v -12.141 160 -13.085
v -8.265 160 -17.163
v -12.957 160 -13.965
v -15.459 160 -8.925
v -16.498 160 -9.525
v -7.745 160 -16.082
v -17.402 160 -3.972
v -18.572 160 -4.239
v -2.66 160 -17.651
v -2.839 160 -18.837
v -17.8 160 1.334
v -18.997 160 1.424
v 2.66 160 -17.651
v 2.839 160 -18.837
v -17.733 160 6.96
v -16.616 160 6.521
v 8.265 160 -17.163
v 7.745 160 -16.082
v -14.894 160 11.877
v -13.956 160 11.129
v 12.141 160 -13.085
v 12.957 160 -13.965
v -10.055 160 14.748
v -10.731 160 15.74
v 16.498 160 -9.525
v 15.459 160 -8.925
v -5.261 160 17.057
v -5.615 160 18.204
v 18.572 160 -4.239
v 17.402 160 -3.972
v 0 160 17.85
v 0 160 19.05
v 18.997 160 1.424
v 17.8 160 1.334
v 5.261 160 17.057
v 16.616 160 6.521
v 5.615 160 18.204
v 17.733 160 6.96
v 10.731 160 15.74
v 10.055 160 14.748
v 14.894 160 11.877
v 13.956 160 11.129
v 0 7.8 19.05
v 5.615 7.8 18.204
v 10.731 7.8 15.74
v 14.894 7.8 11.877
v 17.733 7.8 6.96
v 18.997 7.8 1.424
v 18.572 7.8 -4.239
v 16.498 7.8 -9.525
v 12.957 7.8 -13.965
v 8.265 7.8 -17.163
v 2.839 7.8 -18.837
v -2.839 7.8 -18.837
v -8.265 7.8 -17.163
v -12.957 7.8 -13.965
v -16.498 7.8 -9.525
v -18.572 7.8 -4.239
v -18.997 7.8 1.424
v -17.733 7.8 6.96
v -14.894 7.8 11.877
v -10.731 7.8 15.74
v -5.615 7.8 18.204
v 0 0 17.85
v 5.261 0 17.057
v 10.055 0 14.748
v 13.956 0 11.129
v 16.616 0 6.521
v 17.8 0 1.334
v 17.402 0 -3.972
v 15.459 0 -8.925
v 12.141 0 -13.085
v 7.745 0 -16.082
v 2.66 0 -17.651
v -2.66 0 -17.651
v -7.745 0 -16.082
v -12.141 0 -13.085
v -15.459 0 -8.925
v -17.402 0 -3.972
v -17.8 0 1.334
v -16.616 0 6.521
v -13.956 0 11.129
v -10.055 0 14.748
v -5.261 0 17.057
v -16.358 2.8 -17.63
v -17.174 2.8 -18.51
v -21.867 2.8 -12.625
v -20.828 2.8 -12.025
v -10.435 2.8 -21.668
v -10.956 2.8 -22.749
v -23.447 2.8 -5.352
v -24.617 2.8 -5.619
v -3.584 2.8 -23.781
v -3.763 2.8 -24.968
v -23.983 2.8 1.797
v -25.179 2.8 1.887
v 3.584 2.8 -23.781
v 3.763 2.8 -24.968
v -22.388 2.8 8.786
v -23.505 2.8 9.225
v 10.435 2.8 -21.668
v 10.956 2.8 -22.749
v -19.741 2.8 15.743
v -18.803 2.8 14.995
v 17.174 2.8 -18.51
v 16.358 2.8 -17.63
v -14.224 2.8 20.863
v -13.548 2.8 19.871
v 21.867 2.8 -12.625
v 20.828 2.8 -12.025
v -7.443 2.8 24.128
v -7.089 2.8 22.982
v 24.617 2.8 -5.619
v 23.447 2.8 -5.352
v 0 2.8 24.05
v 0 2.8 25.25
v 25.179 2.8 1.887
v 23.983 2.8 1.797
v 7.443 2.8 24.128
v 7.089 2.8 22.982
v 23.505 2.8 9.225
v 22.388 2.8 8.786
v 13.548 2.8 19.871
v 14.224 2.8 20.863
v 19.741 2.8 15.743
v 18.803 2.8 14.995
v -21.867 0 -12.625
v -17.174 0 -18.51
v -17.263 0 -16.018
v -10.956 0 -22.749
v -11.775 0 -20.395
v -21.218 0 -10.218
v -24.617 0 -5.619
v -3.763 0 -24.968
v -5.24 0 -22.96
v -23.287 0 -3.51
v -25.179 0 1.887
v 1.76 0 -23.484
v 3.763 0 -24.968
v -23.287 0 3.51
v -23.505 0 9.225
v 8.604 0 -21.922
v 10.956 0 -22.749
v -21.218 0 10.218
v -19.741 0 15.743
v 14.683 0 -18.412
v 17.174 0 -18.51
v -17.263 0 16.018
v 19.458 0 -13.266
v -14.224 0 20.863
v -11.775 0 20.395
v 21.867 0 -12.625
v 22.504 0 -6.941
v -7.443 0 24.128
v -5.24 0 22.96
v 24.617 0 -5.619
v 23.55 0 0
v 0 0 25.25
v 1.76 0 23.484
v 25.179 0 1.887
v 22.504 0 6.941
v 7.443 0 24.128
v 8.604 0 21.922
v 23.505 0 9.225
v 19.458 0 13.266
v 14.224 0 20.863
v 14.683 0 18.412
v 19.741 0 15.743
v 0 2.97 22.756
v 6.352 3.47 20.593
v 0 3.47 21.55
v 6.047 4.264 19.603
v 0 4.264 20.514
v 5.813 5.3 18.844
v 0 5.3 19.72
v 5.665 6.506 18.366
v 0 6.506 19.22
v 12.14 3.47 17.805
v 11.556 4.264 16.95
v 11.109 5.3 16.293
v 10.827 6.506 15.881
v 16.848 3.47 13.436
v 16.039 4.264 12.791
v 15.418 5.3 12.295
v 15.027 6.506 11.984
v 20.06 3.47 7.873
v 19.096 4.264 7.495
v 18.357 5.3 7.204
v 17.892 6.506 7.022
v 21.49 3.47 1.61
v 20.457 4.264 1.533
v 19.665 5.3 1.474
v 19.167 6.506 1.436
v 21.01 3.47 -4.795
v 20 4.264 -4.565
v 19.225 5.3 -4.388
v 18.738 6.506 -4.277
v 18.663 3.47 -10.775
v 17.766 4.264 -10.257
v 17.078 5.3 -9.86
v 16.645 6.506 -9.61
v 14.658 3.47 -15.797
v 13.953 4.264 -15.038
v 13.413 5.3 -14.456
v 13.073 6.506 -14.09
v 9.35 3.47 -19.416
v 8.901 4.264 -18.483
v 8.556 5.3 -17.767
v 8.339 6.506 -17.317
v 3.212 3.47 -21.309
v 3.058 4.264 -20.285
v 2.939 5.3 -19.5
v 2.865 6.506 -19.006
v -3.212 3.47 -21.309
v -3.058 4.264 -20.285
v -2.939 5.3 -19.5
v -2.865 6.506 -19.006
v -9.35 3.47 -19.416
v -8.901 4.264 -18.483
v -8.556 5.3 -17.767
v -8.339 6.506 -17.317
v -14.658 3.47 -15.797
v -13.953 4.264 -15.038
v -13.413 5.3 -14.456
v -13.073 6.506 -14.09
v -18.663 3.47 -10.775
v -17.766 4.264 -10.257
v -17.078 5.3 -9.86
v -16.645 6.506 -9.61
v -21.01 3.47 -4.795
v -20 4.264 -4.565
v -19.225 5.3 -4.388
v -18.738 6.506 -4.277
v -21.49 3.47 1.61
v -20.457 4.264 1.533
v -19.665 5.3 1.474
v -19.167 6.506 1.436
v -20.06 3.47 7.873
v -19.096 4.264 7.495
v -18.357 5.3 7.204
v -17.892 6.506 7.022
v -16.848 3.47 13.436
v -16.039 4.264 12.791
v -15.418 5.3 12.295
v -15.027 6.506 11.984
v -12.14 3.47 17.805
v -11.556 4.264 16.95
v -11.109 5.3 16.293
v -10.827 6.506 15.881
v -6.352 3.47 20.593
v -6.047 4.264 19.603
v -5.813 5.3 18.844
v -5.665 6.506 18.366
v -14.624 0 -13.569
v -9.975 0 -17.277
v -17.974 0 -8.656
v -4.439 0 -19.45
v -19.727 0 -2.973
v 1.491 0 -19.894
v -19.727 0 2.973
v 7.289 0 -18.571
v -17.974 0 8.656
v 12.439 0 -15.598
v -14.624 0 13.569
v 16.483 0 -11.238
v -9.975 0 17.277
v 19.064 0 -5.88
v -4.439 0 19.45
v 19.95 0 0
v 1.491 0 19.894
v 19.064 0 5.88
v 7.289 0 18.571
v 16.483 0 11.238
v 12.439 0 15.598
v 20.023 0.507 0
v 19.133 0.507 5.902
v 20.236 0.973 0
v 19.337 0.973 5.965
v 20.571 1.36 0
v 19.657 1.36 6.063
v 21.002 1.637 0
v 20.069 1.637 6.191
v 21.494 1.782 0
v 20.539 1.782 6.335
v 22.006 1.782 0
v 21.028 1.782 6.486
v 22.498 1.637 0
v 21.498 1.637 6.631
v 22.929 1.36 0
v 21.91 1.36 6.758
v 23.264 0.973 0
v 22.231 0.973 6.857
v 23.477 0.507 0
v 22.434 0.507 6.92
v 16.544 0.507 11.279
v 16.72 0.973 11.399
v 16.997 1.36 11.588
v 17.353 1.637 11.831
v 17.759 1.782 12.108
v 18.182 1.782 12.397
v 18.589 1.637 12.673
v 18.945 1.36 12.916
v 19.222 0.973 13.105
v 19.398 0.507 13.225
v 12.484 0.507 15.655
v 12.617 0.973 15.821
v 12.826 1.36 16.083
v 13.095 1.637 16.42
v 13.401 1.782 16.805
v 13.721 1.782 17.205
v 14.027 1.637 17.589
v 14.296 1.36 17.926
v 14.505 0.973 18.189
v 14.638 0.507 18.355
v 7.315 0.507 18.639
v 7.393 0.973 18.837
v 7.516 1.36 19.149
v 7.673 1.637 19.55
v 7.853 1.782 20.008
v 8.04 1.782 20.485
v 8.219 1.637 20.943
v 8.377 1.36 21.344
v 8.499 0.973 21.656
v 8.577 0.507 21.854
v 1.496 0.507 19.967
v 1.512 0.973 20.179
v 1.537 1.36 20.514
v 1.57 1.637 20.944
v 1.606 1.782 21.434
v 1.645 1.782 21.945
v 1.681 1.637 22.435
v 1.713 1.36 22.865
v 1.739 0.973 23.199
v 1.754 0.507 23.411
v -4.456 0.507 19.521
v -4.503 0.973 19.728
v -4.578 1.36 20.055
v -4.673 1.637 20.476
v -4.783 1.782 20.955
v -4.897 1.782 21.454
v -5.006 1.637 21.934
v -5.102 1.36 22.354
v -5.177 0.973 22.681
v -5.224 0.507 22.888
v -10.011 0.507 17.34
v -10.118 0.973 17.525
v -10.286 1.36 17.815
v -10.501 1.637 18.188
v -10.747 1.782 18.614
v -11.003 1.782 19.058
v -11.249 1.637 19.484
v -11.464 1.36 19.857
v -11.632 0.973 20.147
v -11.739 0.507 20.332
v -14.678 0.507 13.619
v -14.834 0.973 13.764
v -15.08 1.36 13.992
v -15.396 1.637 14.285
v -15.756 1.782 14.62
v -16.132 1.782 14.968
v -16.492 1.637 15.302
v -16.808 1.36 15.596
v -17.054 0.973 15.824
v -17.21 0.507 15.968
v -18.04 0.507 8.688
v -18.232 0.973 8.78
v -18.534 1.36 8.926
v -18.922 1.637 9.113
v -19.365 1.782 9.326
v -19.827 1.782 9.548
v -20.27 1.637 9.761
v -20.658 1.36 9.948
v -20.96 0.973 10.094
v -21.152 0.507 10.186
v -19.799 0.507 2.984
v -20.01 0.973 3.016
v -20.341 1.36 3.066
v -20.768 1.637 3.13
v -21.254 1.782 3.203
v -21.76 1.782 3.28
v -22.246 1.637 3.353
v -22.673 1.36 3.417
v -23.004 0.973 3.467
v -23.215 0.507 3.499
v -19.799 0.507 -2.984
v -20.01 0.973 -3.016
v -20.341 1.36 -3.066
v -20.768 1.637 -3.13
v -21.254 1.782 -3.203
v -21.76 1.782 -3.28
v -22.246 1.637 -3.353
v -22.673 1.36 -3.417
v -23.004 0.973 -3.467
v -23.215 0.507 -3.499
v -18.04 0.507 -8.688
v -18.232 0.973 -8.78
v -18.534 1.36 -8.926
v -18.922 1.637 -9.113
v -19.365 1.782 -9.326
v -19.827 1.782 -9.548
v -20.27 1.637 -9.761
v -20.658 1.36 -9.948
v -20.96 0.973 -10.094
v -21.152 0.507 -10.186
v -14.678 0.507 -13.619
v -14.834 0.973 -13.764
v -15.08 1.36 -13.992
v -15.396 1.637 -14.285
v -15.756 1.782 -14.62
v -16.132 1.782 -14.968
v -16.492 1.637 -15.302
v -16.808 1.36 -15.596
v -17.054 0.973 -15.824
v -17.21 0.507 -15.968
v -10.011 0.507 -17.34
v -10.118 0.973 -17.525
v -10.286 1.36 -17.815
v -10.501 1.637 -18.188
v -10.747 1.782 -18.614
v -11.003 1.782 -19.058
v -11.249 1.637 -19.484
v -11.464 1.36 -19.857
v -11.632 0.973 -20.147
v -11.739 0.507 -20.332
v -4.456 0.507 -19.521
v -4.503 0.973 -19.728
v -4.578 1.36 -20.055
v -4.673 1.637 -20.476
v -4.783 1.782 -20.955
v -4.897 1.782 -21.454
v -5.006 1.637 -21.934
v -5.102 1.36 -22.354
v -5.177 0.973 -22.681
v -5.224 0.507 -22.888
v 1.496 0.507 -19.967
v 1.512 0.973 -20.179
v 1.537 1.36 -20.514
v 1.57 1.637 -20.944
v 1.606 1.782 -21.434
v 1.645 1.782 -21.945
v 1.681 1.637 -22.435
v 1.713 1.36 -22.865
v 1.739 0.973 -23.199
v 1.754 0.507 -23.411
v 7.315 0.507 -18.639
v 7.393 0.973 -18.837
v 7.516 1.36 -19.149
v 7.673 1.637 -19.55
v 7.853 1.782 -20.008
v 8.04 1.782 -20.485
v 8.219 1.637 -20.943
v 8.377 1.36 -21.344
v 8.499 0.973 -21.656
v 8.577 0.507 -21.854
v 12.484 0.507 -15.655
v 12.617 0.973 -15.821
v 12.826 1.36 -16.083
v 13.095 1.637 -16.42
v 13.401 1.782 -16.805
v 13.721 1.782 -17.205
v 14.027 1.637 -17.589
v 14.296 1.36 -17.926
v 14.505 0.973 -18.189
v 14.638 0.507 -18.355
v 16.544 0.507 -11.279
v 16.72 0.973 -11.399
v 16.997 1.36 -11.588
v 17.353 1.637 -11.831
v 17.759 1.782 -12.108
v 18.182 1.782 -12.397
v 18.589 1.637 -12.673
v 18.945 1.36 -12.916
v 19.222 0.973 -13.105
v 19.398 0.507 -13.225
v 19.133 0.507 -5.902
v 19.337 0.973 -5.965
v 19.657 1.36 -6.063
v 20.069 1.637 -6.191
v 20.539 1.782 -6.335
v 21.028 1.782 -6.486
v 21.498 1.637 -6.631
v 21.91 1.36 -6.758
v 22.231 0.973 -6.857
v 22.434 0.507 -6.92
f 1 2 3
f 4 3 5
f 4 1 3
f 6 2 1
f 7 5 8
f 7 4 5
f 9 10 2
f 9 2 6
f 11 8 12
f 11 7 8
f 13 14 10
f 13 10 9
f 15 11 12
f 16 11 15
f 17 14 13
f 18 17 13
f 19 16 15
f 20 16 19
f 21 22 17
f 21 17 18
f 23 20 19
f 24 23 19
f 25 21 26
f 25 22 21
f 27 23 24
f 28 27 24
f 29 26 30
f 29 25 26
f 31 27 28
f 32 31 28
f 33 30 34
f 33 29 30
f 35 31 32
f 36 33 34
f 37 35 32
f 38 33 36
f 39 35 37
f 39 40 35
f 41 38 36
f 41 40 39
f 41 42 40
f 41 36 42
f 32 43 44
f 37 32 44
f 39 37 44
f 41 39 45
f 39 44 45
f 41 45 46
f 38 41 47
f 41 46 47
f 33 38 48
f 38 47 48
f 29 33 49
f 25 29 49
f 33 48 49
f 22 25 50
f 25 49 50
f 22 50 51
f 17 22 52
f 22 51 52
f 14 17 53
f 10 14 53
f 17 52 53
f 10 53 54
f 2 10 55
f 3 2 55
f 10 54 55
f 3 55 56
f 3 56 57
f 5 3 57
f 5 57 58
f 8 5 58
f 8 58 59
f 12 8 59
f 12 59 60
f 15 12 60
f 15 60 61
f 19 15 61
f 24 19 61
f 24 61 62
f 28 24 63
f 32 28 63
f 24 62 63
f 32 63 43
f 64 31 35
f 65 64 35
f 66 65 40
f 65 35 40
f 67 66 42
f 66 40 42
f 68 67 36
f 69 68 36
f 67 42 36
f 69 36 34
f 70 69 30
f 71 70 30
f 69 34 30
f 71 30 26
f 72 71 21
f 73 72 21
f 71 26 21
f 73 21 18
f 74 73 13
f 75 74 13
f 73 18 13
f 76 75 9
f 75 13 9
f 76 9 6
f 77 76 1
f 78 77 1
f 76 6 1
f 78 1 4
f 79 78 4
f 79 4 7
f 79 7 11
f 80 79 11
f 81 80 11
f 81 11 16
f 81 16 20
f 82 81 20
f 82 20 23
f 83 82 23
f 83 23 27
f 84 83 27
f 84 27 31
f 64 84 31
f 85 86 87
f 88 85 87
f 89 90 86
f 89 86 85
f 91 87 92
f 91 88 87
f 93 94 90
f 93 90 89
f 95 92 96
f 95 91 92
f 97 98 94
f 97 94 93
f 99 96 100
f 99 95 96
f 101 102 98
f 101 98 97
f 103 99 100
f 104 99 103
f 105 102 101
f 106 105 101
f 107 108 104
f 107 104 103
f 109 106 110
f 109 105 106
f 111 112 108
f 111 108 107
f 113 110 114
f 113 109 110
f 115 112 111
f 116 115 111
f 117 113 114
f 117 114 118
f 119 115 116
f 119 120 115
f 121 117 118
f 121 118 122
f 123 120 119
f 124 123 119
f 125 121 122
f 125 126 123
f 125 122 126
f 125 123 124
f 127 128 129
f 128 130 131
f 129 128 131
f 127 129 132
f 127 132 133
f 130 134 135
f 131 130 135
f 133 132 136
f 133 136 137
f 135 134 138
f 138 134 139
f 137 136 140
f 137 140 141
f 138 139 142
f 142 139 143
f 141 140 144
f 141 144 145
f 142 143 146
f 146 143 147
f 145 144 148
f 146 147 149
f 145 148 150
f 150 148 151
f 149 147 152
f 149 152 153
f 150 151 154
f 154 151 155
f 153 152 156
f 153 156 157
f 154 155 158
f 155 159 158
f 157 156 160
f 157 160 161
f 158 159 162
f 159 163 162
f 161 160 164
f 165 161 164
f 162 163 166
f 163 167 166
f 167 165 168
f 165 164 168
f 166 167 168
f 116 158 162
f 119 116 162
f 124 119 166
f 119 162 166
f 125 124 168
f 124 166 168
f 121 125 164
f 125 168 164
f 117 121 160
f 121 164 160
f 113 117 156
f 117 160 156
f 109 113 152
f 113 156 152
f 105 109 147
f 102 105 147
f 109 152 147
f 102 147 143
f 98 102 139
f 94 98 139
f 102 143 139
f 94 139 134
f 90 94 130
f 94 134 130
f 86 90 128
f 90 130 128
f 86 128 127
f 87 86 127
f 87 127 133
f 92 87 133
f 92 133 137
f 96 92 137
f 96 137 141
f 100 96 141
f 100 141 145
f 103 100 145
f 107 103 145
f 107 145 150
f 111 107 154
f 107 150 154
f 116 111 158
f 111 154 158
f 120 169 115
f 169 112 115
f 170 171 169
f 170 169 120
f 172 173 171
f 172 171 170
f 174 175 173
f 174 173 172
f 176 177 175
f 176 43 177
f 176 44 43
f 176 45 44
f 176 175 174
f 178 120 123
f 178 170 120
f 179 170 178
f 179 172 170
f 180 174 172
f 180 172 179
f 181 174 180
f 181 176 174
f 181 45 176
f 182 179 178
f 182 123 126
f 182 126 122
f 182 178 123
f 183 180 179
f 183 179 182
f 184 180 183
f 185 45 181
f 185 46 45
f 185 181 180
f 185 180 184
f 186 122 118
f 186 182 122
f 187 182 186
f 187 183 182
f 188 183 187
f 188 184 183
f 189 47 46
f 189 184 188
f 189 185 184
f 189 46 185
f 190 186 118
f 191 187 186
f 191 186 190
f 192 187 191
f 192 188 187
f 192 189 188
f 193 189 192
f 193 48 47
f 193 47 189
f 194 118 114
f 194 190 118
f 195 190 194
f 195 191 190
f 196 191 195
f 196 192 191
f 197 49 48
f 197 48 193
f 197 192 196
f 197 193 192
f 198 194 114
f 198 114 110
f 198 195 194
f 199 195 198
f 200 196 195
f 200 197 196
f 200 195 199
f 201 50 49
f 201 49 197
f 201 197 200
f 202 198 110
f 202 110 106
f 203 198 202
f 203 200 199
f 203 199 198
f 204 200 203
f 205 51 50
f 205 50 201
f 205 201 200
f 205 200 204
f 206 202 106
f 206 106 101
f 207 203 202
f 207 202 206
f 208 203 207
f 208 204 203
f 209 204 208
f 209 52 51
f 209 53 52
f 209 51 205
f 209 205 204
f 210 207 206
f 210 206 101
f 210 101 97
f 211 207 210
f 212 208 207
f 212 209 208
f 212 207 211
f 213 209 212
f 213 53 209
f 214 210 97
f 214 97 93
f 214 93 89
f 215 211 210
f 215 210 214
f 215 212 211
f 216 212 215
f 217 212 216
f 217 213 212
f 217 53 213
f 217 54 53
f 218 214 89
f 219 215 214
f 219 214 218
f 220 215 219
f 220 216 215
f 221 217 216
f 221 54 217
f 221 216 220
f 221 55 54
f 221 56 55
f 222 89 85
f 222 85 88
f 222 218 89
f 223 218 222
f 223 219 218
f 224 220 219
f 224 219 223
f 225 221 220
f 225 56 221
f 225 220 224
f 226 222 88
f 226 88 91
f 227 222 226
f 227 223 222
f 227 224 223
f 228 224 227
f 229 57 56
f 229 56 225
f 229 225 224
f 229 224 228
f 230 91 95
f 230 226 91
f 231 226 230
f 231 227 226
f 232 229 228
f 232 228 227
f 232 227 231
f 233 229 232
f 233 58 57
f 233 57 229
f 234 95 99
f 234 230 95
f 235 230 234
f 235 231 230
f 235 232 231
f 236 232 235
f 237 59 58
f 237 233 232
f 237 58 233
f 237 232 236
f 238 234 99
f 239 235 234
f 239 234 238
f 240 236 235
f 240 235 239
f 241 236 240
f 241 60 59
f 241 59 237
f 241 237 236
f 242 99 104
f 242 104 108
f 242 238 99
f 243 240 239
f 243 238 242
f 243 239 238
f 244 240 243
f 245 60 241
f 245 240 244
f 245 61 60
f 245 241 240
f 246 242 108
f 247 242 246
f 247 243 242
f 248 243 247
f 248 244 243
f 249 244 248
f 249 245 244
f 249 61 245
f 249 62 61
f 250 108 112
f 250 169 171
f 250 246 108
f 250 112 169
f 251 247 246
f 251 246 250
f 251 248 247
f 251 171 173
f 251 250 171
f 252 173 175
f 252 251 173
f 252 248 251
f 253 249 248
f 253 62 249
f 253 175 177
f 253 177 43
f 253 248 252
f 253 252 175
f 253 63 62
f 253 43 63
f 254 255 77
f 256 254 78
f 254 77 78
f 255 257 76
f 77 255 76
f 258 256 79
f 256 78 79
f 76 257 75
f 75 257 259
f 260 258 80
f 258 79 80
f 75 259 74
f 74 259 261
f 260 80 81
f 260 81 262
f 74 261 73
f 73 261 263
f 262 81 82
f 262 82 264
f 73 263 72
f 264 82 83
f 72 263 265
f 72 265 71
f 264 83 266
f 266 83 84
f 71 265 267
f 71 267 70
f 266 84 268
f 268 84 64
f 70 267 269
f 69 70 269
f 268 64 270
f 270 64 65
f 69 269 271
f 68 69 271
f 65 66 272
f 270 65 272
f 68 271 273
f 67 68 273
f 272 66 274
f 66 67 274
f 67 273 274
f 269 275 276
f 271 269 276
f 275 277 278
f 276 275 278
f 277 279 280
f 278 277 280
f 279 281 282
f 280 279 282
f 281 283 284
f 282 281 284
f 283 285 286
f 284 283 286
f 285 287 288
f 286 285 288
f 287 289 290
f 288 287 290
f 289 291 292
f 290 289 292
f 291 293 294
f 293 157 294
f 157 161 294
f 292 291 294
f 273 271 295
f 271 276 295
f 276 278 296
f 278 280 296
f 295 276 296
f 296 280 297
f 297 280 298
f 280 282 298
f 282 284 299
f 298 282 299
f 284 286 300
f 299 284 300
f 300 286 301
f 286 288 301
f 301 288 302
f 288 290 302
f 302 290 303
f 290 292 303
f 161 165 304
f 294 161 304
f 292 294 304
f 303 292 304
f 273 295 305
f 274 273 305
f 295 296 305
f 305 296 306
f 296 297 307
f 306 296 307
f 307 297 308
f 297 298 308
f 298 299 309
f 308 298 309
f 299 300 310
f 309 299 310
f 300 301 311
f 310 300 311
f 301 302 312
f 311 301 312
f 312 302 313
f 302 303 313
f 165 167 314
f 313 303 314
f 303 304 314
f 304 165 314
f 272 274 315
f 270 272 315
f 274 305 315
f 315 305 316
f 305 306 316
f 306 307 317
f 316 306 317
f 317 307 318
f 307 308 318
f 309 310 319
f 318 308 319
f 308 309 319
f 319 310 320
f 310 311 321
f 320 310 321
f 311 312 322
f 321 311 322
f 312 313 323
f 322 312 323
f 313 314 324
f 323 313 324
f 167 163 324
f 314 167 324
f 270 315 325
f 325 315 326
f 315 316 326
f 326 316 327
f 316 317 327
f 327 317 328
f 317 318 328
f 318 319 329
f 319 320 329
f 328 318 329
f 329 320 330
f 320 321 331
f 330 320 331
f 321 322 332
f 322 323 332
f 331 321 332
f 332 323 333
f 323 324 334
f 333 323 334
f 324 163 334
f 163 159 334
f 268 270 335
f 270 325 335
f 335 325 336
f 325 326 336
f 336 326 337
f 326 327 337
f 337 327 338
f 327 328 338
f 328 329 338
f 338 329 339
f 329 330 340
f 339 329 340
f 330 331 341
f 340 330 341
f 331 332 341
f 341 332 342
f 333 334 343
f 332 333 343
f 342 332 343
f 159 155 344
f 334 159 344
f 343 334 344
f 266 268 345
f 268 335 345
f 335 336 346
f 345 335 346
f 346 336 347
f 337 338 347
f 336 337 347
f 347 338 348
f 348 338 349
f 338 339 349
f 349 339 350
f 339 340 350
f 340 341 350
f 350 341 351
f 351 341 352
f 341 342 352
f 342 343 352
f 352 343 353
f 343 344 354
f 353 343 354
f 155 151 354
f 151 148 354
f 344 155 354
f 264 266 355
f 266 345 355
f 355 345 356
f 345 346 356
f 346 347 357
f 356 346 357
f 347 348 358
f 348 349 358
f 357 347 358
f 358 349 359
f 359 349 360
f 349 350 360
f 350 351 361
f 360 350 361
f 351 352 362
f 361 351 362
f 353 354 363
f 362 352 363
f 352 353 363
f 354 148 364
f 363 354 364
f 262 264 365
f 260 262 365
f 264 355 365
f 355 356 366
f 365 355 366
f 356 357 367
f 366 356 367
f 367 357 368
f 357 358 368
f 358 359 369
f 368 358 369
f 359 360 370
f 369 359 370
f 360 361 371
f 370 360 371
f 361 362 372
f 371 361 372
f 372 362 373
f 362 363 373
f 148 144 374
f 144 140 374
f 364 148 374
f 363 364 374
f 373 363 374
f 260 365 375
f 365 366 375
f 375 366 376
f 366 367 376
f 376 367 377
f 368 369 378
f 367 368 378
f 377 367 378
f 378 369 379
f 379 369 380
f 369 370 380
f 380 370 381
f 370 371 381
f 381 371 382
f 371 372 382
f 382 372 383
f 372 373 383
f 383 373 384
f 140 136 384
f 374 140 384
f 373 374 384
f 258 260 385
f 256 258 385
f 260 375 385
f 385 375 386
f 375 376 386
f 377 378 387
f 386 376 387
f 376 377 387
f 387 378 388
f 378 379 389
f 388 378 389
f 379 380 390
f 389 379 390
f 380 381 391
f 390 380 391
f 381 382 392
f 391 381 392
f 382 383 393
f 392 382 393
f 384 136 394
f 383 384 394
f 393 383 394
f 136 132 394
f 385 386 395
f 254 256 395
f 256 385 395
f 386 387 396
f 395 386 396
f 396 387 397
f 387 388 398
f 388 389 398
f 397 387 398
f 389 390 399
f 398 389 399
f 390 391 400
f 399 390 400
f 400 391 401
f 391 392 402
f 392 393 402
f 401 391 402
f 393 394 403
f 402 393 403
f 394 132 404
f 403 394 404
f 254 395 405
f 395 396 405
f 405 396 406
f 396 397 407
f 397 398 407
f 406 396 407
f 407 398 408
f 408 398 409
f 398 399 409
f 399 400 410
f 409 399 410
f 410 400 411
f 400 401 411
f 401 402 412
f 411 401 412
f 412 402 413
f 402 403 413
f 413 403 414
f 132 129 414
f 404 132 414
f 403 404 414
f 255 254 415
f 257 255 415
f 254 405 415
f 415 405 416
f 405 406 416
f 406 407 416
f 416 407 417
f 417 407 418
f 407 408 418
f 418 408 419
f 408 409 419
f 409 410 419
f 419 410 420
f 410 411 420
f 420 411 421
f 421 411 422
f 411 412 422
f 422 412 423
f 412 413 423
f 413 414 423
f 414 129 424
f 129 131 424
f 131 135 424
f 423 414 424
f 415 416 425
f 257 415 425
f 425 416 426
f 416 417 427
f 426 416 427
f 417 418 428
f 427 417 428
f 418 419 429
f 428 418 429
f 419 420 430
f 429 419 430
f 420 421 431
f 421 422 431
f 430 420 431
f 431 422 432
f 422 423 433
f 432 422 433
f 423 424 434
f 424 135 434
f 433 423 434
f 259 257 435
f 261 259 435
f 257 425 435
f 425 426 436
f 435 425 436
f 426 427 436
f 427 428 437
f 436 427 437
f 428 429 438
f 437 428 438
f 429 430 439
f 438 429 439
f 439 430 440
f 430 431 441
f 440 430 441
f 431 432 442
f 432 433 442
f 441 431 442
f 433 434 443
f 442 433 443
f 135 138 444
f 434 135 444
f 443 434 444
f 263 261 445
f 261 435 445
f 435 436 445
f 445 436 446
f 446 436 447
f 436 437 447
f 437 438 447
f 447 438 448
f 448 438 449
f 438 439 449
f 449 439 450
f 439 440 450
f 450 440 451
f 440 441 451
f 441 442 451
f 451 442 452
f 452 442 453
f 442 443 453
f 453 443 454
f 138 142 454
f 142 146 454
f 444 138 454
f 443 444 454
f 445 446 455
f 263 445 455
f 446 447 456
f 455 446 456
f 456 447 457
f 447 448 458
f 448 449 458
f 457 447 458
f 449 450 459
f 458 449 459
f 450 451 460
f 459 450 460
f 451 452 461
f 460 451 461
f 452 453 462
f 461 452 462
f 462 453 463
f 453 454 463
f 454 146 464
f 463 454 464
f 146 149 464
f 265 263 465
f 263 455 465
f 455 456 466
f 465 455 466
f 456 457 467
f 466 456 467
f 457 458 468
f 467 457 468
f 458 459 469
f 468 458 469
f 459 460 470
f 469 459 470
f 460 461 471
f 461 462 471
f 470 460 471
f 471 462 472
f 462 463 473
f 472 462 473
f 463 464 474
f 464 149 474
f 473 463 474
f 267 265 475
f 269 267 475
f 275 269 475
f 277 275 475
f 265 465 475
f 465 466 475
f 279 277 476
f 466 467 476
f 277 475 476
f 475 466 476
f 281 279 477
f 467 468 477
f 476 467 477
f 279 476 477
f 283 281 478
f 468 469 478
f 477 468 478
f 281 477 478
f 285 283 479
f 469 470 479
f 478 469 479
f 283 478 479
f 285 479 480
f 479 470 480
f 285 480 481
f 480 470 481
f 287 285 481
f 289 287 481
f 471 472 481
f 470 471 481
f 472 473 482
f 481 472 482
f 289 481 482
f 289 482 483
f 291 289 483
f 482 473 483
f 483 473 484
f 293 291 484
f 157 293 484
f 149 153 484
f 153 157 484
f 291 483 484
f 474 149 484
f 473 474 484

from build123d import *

# Parameters (mm, degrees)
SKETCH_1_R          = 25.25
EXTRUDE_1_DEPTH     = 2.8
SKETCH_2_R          = 19.05
EXTRUDE_2_DEPTH     = 157.2
FILLET_1_R          = 5
SKETCH_3_R          = 17.85
CUT_EXTRUDE_1_DEPTH = 164.936344354
SKETCH_5_R          = 1.8


with BuildPart() as part:
    # 스케치1 → 보스-돌출1 (new body)
    with BuildSketch(Plane(origin=(0, 0, 0), x_dir=(1, 0, 0), z_dir=(0, 1, 0))):
        with Locations(Location((0, 0, 0), (0, 0, 270))):
            Circle(SKETCH_1_R)
    extrude(amount=EXTRUDE_1_DEPTH)

    # 스케치2 → 보스-돌출2 (add)
    with BuildSketch(Plane(origin=(0, 2.8, 0), x_dir=(1, 0, 0), z_dir=(0, 1, 0))):
        with Locations(Location((0, 0, 0), (0, 0, 270))):
            Circle(SKETCH_2_R)
    extrude(amount=EXTRUDE_2_DEPTH)

    # 필렛1
    fillet_1_edges = [part.edges().sort_by_distance(p)[0] for p in [
        (0, 2.8, -19.05),
    ]]
    fillet(fillet_1_edges, radius=FILLET_1_R)

    # 스케치3 → 컷-돌출1 (cut, through all)
    with BuildSketch(Plane(origin=(0, 160, 0), x_dir=(1, 0, 0), z_dir=(0, 1, 0))):
        with Locations(Location((0, 0, 0), (0, 0, 270))):
            Circle(SKETCH_3_R)
    extrude(amount=-CUT_EXTRUDE_1_DEPTH, mode=Mode.SUBTRACT)

    # 컷-스윕1: sweep along a path in 스케치4
    with BuildLine(Plane.XZ) as sweep_1_path:
        CenterArc((0, 0), 21.75, 0, 360)
    # 스케치5 → 컷-스윕1 (sweep, cut)
    with BuildSketch(Plane.XY):
        with Locations((-21.75, 0)):
            Circle(SKETCH_5_R)
    sweep(path=sweep_1_path.line, mode=Mode.SUBTRACT)


solid = part.part
